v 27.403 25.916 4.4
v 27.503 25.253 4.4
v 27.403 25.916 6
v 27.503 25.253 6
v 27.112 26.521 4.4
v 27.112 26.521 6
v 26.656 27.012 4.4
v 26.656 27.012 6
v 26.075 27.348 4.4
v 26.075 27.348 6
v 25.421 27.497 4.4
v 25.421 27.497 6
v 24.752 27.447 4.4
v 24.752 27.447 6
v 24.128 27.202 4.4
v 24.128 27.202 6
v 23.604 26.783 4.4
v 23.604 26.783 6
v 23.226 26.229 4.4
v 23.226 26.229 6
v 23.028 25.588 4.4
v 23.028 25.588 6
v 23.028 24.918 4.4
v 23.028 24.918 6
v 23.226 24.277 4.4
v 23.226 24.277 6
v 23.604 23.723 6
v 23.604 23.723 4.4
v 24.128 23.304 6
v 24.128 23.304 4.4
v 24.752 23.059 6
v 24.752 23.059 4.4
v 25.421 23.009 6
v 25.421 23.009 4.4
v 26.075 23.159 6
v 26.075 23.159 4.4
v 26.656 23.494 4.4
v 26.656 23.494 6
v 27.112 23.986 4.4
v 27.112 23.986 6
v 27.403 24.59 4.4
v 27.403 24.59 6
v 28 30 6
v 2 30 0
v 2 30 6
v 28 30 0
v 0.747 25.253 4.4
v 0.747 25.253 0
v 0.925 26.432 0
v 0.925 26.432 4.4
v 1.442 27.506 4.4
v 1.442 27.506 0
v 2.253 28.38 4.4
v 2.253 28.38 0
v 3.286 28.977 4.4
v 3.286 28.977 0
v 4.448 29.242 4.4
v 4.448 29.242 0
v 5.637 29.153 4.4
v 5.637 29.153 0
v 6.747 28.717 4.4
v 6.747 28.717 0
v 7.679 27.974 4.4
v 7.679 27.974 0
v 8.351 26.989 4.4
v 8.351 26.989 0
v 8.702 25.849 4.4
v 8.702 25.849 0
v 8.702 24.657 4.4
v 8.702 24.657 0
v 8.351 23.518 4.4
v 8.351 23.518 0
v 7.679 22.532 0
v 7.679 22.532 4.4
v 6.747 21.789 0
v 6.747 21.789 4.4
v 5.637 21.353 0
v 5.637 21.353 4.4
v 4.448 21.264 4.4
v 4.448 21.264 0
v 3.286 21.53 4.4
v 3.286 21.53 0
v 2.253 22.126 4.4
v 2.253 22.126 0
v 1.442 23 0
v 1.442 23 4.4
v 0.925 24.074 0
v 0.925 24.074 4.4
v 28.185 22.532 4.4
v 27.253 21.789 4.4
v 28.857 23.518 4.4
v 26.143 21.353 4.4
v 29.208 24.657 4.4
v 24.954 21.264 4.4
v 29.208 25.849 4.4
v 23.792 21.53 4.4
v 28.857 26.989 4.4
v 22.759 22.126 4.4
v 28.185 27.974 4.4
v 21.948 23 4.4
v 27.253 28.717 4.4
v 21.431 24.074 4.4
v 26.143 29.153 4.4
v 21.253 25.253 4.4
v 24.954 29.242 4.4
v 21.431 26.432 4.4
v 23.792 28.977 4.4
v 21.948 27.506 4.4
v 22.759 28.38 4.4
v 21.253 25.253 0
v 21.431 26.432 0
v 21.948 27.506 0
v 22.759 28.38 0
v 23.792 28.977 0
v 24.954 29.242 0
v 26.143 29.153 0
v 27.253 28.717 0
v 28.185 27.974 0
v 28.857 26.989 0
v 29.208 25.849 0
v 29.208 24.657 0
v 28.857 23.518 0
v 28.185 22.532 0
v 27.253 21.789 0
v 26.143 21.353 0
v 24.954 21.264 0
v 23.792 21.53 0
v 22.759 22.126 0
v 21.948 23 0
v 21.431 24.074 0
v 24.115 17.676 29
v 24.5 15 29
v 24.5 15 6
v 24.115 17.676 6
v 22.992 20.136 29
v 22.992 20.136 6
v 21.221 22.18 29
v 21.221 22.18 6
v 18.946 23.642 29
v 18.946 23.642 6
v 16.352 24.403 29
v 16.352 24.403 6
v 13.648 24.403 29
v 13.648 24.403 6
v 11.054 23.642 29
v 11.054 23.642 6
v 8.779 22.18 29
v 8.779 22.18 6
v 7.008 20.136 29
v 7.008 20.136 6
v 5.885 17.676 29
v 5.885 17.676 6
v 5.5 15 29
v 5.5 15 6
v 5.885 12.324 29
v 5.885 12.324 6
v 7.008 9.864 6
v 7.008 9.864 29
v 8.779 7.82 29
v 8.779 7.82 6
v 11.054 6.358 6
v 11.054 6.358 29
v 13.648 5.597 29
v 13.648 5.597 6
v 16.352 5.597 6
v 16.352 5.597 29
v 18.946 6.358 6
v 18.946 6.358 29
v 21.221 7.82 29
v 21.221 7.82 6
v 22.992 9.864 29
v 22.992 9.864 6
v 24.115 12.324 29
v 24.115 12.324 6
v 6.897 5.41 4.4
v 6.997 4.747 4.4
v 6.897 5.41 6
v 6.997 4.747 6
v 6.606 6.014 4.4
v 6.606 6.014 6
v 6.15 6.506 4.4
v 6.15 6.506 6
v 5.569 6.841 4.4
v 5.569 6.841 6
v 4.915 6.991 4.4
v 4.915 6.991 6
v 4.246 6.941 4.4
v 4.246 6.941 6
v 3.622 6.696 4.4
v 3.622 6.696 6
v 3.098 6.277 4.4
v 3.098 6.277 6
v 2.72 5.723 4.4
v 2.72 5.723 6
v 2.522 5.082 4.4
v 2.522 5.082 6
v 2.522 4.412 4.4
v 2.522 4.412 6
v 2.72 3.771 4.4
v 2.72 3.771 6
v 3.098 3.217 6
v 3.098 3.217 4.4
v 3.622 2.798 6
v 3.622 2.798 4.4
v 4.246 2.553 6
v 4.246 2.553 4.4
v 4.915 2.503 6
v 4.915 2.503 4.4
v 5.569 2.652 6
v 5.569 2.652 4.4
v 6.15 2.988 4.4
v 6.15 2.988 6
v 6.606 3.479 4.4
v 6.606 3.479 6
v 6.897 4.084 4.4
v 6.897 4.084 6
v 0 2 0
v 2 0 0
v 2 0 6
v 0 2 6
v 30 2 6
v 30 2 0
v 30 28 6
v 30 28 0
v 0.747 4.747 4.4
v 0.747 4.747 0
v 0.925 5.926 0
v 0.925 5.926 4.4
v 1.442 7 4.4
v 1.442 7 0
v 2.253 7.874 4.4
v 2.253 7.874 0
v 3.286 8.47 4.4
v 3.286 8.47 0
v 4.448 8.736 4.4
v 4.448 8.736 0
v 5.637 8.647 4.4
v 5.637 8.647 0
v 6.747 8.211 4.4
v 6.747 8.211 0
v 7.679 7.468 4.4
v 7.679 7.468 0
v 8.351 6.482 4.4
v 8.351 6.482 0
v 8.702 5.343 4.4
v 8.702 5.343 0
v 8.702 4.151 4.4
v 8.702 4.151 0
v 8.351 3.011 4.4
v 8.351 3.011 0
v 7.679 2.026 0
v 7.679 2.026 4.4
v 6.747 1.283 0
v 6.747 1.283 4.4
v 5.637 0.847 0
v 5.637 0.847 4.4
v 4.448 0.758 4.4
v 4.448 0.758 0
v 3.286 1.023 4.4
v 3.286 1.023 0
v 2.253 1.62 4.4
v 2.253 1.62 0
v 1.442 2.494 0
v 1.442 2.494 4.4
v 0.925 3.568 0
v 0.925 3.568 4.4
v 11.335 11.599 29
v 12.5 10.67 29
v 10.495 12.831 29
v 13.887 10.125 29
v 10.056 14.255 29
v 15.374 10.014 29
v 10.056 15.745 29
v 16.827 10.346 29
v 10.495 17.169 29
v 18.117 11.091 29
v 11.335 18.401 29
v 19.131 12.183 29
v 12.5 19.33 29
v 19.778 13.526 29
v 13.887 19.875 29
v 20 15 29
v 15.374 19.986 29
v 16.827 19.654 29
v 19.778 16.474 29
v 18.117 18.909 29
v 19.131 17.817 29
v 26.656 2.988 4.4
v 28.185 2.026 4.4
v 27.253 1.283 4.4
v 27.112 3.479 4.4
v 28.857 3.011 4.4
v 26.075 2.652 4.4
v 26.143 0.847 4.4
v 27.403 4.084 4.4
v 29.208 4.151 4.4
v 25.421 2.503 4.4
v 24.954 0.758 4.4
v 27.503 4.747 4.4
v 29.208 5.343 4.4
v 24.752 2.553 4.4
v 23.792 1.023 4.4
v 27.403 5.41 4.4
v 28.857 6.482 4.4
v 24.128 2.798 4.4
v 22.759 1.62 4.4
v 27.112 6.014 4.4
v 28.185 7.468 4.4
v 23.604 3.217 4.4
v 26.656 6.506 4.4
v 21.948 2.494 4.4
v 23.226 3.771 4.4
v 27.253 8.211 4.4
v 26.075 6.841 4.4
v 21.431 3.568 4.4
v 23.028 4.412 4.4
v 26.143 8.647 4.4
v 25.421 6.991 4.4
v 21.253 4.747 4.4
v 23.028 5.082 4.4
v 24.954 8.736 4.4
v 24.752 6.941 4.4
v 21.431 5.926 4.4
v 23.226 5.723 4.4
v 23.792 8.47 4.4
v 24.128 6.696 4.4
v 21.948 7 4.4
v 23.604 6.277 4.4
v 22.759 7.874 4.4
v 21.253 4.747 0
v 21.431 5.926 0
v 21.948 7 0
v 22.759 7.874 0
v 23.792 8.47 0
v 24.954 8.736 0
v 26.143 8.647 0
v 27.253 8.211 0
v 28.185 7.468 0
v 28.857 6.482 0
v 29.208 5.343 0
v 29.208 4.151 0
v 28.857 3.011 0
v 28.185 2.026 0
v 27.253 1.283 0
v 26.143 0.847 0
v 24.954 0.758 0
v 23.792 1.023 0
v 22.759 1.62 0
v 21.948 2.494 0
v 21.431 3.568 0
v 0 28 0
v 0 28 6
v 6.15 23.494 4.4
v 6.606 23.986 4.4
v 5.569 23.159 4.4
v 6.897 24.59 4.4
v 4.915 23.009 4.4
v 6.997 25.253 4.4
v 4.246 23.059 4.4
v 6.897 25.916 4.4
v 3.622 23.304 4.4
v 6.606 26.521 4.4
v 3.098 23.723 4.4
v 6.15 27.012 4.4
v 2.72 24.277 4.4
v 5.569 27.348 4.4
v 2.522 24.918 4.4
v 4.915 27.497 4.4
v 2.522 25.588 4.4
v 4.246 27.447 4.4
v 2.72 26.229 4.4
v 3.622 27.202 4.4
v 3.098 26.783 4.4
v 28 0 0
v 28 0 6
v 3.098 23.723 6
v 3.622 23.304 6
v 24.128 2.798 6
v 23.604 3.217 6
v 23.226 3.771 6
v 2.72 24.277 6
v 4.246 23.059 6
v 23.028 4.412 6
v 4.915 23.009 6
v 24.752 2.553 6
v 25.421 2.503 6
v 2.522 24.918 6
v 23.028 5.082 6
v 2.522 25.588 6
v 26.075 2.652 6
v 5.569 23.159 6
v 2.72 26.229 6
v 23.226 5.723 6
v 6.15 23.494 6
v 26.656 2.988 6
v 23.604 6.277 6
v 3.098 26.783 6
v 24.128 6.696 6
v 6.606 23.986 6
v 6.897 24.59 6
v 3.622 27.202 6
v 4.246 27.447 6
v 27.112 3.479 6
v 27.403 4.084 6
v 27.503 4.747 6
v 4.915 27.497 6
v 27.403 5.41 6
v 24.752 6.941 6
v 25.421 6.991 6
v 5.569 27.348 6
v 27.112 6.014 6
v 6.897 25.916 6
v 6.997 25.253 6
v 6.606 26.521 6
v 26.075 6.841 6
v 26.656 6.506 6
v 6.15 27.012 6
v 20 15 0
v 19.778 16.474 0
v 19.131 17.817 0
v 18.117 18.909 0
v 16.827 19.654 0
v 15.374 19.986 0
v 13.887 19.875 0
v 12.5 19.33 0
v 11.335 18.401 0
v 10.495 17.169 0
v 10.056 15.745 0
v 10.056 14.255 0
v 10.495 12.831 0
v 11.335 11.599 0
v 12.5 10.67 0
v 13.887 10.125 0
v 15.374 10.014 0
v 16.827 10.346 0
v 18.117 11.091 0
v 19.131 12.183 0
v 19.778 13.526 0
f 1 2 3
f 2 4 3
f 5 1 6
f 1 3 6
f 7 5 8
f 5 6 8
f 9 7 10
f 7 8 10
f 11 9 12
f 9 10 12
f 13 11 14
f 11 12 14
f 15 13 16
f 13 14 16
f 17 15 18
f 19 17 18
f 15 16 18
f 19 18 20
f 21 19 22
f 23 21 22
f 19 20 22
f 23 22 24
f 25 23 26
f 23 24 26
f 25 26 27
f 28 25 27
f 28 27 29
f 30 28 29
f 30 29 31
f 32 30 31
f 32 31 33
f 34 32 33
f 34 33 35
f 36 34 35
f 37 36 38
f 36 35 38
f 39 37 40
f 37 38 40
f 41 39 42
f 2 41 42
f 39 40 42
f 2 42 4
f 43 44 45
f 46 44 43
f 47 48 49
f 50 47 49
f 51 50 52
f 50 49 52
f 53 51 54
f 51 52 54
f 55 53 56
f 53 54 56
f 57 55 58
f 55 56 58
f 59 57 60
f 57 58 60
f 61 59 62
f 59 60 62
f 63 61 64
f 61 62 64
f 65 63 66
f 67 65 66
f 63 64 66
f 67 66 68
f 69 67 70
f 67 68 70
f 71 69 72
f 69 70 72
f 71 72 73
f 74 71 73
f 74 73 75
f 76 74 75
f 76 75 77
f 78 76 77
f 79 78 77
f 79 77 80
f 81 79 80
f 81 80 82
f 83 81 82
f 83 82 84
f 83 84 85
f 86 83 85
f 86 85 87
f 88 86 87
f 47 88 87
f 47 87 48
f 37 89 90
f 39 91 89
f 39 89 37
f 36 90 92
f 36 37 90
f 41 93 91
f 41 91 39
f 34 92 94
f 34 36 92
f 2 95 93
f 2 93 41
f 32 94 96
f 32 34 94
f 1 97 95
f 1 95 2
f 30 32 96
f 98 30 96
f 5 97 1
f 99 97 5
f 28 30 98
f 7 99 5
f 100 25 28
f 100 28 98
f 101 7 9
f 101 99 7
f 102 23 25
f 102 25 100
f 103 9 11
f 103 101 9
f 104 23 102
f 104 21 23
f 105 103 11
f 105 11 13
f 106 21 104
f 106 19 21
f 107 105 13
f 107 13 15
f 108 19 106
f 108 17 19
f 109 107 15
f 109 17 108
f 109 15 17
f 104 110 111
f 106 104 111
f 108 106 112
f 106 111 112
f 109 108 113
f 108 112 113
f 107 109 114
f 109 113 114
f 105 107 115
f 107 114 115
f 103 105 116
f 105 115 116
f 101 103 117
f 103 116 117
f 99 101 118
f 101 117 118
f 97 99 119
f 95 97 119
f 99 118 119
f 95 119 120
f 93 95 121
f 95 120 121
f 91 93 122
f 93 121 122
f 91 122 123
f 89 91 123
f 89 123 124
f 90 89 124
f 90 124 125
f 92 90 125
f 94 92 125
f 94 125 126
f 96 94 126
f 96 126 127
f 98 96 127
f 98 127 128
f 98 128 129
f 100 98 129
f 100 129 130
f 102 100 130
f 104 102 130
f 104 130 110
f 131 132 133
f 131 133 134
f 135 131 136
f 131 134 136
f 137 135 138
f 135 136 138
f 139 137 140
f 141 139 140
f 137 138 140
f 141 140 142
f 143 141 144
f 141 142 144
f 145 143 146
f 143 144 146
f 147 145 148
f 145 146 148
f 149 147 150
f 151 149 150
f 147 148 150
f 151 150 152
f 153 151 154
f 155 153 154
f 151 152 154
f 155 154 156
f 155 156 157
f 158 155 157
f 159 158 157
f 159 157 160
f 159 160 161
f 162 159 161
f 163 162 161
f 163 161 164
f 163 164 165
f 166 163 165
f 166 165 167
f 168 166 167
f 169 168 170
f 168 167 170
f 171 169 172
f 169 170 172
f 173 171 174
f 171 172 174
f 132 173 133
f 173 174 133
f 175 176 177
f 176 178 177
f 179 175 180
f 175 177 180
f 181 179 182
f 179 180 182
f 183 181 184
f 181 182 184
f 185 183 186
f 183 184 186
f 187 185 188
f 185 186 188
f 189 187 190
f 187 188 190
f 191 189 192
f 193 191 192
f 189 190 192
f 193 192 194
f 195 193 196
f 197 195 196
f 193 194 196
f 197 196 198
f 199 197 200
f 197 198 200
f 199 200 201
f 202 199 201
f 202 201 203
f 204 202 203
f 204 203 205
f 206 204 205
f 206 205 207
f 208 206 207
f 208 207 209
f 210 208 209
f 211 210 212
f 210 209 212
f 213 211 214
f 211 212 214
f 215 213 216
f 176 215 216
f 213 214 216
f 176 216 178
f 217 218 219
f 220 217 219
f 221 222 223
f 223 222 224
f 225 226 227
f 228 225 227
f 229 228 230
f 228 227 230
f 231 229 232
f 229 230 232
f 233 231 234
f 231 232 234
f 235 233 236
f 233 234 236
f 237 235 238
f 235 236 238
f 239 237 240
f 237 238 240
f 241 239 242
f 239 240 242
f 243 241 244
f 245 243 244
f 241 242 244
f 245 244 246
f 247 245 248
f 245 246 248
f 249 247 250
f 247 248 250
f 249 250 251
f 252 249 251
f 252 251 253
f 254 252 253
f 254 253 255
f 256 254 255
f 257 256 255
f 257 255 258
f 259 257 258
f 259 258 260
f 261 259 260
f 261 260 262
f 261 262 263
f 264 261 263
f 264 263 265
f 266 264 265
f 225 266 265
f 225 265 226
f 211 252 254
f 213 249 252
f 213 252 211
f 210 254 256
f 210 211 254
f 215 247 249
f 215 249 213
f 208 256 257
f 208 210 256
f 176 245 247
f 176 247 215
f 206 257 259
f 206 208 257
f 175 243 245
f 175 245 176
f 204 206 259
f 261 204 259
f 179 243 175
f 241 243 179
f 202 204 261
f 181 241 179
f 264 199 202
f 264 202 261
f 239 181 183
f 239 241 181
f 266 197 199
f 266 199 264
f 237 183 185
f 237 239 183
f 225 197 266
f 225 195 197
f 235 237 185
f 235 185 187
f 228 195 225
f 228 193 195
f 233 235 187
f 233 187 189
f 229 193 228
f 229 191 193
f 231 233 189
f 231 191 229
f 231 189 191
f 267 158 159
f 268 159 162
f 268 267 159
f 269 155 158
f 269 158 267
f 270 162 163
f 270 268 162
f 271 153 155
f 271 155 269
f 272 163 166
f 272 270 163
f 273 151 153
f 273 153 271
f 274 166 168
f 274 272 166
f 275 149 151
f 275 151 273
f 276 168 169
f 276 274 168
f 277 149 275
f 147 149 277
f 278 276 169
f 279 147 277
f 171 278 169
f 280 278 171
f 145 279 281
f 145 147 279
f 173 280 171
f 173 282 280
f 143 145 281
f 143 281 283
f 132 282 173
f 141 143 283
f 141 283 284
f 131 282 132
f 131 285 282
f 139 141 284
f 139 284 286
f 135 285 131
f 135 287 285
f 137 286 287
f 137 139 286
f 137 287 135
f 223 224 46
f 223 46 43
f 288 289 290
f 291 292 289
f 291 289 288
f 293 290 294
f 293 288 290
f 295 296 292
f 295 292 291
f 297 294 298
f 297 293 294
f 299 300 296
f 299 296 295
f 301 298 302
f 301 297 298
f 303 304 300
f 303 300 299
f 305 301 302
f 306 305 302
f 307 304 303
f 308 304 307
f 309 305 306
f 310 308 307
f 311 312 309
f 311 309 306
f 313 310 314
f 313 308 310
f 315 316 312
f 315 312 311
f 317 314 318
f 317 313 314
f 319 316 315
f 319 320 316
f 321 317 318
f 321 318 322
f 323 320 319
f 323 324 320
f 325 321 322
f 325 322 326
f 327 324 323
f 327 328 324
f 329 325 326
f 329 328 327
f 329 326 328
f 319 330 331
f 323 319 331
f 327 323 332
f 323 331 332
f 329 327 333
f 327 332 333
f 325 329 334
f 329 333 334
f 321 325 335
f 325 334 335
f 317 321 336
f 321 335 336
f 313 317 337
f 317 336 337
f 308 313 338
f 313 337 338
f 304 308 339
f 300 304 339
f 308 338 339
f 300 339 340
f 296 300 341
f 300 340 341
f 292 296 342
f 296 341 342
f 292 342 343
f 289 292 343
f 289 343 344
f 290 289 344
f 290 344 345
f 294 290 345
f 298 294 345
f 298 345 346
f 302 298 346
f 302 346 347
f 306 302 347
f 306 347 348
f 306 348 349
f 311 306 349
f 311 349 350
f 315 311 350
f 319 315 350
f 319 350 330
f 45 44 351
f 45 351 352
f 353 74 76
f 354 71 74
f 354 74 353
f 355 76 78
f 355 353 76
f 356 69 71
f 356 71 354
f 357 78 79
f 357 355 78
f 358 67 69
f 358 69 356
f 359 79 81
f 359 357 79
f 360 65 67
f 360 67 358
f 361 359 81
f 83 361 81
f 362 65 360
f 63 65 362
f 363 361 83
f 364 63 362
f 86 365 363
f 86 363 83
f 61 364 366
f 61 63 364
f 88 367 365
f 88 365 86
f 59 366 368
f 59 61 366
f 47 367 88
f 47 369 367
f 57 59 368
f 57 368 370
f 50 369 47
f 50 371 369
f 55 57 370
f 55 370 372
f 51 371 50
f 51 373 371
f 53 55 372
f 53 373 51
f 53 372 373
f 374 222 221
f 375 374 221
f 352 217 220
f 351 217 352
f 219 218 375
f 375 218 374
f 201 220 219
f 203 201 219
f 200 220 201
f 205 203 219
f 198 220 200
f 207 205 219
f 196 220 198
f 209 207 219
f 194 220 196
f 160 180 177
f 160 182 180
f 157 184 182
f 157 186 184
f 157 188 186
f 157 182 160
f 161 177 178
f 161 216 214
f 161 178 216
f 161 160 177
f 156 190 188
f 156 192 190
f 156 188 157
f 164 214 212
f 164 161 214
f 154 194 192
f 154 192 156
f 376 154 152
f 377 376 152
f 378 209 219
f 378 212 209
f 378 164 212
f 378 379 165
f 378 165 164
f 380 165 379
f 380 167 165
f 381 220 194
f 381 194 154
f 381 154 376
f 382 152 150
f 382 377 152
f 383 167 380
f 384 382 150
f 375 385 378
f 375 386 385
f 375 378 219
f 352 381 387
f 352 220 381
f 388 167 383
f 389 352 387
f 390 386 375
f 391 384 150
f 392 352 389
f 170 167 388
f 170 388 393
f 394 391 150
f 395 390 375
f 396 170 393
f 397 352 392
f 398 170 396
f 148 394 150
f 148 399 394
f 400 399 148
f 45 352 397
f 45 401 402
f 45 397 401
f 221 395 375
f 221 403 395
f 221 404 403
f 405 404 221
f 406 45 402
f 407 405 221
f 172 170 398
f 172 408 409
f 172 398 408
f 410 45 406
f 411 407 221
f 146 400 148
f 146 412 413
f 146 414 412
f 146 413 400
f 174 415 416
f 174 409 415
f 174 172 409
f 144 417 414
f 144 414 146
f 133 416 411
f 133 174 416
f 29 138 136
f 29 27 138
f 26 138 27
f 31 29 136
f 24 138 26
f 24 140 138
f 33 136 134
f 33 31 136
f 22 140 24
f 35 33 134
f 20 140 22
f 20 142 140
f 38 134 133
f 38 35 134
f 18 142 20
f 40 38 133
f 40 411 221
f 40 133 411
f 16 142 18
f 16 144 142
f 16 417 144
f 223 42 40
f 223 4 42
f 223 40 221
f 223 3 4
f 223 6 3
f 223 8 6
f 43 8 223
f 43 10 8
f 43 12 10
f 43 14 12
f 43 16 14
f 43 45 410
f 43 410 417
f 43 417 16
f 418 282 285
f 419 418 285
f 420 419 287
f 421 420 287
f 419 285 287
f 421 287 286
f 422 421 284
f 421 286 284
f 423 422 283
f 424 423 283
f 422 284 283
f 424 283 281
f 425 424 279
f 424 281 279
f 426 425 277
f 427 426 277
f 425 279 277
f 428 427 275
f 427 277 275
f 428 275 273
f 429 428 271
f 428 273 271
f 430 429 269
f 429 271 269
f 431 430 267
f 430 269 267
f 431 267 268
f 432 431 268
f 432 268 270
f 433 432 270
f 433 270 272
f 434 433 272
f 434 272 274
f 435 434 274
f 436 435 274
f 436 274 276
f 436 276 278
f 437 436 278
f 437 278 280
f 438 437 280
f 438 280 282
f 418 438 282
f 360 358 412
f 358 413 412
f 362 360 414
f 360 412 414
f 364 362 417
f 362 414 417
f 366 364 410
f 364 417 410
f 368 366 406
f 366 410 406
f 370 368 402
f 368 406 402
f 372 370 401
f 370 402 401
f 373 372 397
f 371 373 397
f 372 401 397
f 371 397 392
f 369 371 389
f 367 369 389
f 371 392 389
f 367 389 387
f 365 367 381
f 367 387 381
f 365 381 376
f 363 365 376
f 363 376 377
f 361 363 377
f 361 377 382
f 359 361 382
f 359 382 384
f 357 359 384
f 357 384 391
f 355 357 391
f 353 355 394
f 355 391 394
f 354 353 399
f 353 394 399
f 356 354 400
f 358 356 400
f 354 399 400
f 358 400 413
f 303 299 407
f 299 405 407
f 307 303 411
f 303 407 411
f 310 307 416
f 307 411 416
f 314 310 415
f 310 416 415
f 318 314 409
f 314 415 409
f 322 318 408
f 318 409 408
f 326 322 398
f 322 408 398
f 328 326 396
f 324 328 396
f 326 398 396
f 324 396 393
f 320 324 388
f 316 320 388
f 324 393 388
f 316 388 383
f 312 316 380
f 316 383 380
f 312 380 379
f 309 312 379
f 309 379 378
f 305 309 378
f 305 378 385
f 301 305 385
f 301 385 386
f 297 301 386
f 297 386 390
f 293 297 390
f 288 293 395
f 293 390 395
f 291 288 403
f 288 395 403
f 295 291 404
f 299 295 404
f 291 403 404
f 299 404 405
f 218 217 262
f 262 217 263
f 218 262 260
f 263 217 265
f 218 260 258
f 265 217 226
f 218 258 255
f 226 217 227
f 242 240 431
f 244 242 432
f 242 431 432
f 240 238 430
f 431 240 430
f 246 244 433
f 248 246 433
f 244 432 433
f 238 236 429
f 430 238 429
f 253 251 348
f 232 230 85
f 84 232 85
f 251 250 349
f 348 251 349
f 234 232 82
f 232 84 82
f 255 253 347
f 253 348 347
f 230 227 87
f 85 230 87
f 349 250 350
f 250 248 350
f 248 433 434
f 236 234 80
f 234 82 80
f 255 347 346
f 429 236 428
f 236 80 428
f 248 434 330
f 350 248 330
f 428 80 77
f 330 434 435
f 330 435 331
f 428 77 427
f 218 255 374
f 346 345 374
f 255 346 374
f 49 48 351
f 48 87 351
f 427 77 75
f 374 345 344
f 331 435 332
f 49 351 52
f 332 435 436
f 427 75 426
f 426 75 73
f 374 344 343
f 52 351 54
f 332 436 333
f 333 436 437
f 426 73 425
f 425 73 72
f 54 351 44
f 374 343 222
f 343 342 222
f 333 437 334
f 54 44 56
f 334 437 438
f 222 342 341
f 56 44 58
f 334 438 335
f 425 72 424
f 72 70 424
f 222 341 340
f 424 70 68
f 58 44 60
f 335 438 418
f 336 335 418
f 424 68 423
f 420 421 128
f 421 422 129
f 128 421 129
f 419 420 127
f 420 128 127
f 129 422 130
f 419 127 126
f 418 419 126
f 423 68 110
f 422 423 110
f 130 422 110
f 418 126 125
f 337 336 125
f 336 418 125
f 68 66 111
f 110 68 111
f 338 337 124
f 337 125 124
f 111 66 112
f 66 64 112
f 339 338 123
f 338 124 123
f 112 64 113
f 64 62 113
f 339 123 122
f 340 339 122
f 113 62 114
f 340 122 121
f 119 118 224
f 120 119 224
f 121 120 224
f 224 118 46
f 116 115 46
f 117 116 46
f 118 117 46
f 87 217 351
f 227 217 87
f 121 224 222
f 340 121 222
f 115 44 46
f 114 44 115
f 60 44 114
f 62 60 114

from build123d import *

# Parameters (mm, degrees)
SKETCH1_W                               = 30
SKETCH1_H                               = 30
BOSS_EXTRUDE1_DEPTH                     = 6
SKETCH2_R                               = 9.5
BOSS_EXTRUDE2_DEPTH                     = 23
SKETCH3_R                               = 5
CUT_EXTRUDE1_DEPTH                      = 52.39066063
CBORE_FOR_M5_HEX_HEAD_BOLT1_D           = 4.5
CBORE_FOR_M5_HEX_HEAD_BOLT1_CBORE_D     = 8
CBORE_FOR_M5_HEX_HEAD_BOLT1_CBORE_DEPTH = 4.4
CHAMFER1_SIZE                           = 2


with BuildPart() as part:
    # Sketch1 → Boss-Extrude1 (new body)
    with BuildSketch(Plane.XY):
        with Locations((15, 15)):
            Rectangle(SKETCH1_W, SKETCH1_H)
    extrude(amount=BOSS_EXTRUDE1_DEPTH)

    # Sketch2 → Boss-Extrude2 (add)
    with BuildSketch(Plane.XY.offset(6)):
        with Locations((15, 15)):
            Circle(SKETCH2_R)
    extrude(amount=BOSS_EXTRUDE2_DEPTH)

    # Sketch3 → Cut-Extrude1 (cut, through all)
    with BuildSketch(Plane.XY.offset(29)):
        with Locations((15, 15)):
            Circle(SKETCH3_R)
    extrude(amount=-CUT_EXTRUDE1_DEPTH, mode=Mode.SUBTRACT)

    # CBORE for M5 Hex Head Bolt1 (through all)
    with Locations(Plane(origin=(0, 0, 0), x_dir=(-1, 0, 0), z_dir=(0, 0, -1))):
        with Locations((-25.253048327, 25.253048327), (-4.746951673, 25.253048327), (-4.746951673, 4.746951673), (-25.253048327, 4.746951673)):
            CounterBoreHole(CBORE_FOR_M5_HEX_HEAD_BOLT1_D / 2, CBORE_FOR_M5_HEX_HEAD_BOLT1_CBORE_D / 2, CBORE_FOR_M5_HEX_HEAD_BOLT1_CBORE_DEPTH)

    # Chamfer1
    chamfer1_edges = [part.edges().sort_by_distance(p)[0] for p in [
        (0, 30, 3),
        (30, 30, 3),
        (30, 0, 3),
        (0, 0, 3),
    ]]
    chamfer(chamfer1_edges, length=CHAMFER1_SIZE)


solid = part.part
